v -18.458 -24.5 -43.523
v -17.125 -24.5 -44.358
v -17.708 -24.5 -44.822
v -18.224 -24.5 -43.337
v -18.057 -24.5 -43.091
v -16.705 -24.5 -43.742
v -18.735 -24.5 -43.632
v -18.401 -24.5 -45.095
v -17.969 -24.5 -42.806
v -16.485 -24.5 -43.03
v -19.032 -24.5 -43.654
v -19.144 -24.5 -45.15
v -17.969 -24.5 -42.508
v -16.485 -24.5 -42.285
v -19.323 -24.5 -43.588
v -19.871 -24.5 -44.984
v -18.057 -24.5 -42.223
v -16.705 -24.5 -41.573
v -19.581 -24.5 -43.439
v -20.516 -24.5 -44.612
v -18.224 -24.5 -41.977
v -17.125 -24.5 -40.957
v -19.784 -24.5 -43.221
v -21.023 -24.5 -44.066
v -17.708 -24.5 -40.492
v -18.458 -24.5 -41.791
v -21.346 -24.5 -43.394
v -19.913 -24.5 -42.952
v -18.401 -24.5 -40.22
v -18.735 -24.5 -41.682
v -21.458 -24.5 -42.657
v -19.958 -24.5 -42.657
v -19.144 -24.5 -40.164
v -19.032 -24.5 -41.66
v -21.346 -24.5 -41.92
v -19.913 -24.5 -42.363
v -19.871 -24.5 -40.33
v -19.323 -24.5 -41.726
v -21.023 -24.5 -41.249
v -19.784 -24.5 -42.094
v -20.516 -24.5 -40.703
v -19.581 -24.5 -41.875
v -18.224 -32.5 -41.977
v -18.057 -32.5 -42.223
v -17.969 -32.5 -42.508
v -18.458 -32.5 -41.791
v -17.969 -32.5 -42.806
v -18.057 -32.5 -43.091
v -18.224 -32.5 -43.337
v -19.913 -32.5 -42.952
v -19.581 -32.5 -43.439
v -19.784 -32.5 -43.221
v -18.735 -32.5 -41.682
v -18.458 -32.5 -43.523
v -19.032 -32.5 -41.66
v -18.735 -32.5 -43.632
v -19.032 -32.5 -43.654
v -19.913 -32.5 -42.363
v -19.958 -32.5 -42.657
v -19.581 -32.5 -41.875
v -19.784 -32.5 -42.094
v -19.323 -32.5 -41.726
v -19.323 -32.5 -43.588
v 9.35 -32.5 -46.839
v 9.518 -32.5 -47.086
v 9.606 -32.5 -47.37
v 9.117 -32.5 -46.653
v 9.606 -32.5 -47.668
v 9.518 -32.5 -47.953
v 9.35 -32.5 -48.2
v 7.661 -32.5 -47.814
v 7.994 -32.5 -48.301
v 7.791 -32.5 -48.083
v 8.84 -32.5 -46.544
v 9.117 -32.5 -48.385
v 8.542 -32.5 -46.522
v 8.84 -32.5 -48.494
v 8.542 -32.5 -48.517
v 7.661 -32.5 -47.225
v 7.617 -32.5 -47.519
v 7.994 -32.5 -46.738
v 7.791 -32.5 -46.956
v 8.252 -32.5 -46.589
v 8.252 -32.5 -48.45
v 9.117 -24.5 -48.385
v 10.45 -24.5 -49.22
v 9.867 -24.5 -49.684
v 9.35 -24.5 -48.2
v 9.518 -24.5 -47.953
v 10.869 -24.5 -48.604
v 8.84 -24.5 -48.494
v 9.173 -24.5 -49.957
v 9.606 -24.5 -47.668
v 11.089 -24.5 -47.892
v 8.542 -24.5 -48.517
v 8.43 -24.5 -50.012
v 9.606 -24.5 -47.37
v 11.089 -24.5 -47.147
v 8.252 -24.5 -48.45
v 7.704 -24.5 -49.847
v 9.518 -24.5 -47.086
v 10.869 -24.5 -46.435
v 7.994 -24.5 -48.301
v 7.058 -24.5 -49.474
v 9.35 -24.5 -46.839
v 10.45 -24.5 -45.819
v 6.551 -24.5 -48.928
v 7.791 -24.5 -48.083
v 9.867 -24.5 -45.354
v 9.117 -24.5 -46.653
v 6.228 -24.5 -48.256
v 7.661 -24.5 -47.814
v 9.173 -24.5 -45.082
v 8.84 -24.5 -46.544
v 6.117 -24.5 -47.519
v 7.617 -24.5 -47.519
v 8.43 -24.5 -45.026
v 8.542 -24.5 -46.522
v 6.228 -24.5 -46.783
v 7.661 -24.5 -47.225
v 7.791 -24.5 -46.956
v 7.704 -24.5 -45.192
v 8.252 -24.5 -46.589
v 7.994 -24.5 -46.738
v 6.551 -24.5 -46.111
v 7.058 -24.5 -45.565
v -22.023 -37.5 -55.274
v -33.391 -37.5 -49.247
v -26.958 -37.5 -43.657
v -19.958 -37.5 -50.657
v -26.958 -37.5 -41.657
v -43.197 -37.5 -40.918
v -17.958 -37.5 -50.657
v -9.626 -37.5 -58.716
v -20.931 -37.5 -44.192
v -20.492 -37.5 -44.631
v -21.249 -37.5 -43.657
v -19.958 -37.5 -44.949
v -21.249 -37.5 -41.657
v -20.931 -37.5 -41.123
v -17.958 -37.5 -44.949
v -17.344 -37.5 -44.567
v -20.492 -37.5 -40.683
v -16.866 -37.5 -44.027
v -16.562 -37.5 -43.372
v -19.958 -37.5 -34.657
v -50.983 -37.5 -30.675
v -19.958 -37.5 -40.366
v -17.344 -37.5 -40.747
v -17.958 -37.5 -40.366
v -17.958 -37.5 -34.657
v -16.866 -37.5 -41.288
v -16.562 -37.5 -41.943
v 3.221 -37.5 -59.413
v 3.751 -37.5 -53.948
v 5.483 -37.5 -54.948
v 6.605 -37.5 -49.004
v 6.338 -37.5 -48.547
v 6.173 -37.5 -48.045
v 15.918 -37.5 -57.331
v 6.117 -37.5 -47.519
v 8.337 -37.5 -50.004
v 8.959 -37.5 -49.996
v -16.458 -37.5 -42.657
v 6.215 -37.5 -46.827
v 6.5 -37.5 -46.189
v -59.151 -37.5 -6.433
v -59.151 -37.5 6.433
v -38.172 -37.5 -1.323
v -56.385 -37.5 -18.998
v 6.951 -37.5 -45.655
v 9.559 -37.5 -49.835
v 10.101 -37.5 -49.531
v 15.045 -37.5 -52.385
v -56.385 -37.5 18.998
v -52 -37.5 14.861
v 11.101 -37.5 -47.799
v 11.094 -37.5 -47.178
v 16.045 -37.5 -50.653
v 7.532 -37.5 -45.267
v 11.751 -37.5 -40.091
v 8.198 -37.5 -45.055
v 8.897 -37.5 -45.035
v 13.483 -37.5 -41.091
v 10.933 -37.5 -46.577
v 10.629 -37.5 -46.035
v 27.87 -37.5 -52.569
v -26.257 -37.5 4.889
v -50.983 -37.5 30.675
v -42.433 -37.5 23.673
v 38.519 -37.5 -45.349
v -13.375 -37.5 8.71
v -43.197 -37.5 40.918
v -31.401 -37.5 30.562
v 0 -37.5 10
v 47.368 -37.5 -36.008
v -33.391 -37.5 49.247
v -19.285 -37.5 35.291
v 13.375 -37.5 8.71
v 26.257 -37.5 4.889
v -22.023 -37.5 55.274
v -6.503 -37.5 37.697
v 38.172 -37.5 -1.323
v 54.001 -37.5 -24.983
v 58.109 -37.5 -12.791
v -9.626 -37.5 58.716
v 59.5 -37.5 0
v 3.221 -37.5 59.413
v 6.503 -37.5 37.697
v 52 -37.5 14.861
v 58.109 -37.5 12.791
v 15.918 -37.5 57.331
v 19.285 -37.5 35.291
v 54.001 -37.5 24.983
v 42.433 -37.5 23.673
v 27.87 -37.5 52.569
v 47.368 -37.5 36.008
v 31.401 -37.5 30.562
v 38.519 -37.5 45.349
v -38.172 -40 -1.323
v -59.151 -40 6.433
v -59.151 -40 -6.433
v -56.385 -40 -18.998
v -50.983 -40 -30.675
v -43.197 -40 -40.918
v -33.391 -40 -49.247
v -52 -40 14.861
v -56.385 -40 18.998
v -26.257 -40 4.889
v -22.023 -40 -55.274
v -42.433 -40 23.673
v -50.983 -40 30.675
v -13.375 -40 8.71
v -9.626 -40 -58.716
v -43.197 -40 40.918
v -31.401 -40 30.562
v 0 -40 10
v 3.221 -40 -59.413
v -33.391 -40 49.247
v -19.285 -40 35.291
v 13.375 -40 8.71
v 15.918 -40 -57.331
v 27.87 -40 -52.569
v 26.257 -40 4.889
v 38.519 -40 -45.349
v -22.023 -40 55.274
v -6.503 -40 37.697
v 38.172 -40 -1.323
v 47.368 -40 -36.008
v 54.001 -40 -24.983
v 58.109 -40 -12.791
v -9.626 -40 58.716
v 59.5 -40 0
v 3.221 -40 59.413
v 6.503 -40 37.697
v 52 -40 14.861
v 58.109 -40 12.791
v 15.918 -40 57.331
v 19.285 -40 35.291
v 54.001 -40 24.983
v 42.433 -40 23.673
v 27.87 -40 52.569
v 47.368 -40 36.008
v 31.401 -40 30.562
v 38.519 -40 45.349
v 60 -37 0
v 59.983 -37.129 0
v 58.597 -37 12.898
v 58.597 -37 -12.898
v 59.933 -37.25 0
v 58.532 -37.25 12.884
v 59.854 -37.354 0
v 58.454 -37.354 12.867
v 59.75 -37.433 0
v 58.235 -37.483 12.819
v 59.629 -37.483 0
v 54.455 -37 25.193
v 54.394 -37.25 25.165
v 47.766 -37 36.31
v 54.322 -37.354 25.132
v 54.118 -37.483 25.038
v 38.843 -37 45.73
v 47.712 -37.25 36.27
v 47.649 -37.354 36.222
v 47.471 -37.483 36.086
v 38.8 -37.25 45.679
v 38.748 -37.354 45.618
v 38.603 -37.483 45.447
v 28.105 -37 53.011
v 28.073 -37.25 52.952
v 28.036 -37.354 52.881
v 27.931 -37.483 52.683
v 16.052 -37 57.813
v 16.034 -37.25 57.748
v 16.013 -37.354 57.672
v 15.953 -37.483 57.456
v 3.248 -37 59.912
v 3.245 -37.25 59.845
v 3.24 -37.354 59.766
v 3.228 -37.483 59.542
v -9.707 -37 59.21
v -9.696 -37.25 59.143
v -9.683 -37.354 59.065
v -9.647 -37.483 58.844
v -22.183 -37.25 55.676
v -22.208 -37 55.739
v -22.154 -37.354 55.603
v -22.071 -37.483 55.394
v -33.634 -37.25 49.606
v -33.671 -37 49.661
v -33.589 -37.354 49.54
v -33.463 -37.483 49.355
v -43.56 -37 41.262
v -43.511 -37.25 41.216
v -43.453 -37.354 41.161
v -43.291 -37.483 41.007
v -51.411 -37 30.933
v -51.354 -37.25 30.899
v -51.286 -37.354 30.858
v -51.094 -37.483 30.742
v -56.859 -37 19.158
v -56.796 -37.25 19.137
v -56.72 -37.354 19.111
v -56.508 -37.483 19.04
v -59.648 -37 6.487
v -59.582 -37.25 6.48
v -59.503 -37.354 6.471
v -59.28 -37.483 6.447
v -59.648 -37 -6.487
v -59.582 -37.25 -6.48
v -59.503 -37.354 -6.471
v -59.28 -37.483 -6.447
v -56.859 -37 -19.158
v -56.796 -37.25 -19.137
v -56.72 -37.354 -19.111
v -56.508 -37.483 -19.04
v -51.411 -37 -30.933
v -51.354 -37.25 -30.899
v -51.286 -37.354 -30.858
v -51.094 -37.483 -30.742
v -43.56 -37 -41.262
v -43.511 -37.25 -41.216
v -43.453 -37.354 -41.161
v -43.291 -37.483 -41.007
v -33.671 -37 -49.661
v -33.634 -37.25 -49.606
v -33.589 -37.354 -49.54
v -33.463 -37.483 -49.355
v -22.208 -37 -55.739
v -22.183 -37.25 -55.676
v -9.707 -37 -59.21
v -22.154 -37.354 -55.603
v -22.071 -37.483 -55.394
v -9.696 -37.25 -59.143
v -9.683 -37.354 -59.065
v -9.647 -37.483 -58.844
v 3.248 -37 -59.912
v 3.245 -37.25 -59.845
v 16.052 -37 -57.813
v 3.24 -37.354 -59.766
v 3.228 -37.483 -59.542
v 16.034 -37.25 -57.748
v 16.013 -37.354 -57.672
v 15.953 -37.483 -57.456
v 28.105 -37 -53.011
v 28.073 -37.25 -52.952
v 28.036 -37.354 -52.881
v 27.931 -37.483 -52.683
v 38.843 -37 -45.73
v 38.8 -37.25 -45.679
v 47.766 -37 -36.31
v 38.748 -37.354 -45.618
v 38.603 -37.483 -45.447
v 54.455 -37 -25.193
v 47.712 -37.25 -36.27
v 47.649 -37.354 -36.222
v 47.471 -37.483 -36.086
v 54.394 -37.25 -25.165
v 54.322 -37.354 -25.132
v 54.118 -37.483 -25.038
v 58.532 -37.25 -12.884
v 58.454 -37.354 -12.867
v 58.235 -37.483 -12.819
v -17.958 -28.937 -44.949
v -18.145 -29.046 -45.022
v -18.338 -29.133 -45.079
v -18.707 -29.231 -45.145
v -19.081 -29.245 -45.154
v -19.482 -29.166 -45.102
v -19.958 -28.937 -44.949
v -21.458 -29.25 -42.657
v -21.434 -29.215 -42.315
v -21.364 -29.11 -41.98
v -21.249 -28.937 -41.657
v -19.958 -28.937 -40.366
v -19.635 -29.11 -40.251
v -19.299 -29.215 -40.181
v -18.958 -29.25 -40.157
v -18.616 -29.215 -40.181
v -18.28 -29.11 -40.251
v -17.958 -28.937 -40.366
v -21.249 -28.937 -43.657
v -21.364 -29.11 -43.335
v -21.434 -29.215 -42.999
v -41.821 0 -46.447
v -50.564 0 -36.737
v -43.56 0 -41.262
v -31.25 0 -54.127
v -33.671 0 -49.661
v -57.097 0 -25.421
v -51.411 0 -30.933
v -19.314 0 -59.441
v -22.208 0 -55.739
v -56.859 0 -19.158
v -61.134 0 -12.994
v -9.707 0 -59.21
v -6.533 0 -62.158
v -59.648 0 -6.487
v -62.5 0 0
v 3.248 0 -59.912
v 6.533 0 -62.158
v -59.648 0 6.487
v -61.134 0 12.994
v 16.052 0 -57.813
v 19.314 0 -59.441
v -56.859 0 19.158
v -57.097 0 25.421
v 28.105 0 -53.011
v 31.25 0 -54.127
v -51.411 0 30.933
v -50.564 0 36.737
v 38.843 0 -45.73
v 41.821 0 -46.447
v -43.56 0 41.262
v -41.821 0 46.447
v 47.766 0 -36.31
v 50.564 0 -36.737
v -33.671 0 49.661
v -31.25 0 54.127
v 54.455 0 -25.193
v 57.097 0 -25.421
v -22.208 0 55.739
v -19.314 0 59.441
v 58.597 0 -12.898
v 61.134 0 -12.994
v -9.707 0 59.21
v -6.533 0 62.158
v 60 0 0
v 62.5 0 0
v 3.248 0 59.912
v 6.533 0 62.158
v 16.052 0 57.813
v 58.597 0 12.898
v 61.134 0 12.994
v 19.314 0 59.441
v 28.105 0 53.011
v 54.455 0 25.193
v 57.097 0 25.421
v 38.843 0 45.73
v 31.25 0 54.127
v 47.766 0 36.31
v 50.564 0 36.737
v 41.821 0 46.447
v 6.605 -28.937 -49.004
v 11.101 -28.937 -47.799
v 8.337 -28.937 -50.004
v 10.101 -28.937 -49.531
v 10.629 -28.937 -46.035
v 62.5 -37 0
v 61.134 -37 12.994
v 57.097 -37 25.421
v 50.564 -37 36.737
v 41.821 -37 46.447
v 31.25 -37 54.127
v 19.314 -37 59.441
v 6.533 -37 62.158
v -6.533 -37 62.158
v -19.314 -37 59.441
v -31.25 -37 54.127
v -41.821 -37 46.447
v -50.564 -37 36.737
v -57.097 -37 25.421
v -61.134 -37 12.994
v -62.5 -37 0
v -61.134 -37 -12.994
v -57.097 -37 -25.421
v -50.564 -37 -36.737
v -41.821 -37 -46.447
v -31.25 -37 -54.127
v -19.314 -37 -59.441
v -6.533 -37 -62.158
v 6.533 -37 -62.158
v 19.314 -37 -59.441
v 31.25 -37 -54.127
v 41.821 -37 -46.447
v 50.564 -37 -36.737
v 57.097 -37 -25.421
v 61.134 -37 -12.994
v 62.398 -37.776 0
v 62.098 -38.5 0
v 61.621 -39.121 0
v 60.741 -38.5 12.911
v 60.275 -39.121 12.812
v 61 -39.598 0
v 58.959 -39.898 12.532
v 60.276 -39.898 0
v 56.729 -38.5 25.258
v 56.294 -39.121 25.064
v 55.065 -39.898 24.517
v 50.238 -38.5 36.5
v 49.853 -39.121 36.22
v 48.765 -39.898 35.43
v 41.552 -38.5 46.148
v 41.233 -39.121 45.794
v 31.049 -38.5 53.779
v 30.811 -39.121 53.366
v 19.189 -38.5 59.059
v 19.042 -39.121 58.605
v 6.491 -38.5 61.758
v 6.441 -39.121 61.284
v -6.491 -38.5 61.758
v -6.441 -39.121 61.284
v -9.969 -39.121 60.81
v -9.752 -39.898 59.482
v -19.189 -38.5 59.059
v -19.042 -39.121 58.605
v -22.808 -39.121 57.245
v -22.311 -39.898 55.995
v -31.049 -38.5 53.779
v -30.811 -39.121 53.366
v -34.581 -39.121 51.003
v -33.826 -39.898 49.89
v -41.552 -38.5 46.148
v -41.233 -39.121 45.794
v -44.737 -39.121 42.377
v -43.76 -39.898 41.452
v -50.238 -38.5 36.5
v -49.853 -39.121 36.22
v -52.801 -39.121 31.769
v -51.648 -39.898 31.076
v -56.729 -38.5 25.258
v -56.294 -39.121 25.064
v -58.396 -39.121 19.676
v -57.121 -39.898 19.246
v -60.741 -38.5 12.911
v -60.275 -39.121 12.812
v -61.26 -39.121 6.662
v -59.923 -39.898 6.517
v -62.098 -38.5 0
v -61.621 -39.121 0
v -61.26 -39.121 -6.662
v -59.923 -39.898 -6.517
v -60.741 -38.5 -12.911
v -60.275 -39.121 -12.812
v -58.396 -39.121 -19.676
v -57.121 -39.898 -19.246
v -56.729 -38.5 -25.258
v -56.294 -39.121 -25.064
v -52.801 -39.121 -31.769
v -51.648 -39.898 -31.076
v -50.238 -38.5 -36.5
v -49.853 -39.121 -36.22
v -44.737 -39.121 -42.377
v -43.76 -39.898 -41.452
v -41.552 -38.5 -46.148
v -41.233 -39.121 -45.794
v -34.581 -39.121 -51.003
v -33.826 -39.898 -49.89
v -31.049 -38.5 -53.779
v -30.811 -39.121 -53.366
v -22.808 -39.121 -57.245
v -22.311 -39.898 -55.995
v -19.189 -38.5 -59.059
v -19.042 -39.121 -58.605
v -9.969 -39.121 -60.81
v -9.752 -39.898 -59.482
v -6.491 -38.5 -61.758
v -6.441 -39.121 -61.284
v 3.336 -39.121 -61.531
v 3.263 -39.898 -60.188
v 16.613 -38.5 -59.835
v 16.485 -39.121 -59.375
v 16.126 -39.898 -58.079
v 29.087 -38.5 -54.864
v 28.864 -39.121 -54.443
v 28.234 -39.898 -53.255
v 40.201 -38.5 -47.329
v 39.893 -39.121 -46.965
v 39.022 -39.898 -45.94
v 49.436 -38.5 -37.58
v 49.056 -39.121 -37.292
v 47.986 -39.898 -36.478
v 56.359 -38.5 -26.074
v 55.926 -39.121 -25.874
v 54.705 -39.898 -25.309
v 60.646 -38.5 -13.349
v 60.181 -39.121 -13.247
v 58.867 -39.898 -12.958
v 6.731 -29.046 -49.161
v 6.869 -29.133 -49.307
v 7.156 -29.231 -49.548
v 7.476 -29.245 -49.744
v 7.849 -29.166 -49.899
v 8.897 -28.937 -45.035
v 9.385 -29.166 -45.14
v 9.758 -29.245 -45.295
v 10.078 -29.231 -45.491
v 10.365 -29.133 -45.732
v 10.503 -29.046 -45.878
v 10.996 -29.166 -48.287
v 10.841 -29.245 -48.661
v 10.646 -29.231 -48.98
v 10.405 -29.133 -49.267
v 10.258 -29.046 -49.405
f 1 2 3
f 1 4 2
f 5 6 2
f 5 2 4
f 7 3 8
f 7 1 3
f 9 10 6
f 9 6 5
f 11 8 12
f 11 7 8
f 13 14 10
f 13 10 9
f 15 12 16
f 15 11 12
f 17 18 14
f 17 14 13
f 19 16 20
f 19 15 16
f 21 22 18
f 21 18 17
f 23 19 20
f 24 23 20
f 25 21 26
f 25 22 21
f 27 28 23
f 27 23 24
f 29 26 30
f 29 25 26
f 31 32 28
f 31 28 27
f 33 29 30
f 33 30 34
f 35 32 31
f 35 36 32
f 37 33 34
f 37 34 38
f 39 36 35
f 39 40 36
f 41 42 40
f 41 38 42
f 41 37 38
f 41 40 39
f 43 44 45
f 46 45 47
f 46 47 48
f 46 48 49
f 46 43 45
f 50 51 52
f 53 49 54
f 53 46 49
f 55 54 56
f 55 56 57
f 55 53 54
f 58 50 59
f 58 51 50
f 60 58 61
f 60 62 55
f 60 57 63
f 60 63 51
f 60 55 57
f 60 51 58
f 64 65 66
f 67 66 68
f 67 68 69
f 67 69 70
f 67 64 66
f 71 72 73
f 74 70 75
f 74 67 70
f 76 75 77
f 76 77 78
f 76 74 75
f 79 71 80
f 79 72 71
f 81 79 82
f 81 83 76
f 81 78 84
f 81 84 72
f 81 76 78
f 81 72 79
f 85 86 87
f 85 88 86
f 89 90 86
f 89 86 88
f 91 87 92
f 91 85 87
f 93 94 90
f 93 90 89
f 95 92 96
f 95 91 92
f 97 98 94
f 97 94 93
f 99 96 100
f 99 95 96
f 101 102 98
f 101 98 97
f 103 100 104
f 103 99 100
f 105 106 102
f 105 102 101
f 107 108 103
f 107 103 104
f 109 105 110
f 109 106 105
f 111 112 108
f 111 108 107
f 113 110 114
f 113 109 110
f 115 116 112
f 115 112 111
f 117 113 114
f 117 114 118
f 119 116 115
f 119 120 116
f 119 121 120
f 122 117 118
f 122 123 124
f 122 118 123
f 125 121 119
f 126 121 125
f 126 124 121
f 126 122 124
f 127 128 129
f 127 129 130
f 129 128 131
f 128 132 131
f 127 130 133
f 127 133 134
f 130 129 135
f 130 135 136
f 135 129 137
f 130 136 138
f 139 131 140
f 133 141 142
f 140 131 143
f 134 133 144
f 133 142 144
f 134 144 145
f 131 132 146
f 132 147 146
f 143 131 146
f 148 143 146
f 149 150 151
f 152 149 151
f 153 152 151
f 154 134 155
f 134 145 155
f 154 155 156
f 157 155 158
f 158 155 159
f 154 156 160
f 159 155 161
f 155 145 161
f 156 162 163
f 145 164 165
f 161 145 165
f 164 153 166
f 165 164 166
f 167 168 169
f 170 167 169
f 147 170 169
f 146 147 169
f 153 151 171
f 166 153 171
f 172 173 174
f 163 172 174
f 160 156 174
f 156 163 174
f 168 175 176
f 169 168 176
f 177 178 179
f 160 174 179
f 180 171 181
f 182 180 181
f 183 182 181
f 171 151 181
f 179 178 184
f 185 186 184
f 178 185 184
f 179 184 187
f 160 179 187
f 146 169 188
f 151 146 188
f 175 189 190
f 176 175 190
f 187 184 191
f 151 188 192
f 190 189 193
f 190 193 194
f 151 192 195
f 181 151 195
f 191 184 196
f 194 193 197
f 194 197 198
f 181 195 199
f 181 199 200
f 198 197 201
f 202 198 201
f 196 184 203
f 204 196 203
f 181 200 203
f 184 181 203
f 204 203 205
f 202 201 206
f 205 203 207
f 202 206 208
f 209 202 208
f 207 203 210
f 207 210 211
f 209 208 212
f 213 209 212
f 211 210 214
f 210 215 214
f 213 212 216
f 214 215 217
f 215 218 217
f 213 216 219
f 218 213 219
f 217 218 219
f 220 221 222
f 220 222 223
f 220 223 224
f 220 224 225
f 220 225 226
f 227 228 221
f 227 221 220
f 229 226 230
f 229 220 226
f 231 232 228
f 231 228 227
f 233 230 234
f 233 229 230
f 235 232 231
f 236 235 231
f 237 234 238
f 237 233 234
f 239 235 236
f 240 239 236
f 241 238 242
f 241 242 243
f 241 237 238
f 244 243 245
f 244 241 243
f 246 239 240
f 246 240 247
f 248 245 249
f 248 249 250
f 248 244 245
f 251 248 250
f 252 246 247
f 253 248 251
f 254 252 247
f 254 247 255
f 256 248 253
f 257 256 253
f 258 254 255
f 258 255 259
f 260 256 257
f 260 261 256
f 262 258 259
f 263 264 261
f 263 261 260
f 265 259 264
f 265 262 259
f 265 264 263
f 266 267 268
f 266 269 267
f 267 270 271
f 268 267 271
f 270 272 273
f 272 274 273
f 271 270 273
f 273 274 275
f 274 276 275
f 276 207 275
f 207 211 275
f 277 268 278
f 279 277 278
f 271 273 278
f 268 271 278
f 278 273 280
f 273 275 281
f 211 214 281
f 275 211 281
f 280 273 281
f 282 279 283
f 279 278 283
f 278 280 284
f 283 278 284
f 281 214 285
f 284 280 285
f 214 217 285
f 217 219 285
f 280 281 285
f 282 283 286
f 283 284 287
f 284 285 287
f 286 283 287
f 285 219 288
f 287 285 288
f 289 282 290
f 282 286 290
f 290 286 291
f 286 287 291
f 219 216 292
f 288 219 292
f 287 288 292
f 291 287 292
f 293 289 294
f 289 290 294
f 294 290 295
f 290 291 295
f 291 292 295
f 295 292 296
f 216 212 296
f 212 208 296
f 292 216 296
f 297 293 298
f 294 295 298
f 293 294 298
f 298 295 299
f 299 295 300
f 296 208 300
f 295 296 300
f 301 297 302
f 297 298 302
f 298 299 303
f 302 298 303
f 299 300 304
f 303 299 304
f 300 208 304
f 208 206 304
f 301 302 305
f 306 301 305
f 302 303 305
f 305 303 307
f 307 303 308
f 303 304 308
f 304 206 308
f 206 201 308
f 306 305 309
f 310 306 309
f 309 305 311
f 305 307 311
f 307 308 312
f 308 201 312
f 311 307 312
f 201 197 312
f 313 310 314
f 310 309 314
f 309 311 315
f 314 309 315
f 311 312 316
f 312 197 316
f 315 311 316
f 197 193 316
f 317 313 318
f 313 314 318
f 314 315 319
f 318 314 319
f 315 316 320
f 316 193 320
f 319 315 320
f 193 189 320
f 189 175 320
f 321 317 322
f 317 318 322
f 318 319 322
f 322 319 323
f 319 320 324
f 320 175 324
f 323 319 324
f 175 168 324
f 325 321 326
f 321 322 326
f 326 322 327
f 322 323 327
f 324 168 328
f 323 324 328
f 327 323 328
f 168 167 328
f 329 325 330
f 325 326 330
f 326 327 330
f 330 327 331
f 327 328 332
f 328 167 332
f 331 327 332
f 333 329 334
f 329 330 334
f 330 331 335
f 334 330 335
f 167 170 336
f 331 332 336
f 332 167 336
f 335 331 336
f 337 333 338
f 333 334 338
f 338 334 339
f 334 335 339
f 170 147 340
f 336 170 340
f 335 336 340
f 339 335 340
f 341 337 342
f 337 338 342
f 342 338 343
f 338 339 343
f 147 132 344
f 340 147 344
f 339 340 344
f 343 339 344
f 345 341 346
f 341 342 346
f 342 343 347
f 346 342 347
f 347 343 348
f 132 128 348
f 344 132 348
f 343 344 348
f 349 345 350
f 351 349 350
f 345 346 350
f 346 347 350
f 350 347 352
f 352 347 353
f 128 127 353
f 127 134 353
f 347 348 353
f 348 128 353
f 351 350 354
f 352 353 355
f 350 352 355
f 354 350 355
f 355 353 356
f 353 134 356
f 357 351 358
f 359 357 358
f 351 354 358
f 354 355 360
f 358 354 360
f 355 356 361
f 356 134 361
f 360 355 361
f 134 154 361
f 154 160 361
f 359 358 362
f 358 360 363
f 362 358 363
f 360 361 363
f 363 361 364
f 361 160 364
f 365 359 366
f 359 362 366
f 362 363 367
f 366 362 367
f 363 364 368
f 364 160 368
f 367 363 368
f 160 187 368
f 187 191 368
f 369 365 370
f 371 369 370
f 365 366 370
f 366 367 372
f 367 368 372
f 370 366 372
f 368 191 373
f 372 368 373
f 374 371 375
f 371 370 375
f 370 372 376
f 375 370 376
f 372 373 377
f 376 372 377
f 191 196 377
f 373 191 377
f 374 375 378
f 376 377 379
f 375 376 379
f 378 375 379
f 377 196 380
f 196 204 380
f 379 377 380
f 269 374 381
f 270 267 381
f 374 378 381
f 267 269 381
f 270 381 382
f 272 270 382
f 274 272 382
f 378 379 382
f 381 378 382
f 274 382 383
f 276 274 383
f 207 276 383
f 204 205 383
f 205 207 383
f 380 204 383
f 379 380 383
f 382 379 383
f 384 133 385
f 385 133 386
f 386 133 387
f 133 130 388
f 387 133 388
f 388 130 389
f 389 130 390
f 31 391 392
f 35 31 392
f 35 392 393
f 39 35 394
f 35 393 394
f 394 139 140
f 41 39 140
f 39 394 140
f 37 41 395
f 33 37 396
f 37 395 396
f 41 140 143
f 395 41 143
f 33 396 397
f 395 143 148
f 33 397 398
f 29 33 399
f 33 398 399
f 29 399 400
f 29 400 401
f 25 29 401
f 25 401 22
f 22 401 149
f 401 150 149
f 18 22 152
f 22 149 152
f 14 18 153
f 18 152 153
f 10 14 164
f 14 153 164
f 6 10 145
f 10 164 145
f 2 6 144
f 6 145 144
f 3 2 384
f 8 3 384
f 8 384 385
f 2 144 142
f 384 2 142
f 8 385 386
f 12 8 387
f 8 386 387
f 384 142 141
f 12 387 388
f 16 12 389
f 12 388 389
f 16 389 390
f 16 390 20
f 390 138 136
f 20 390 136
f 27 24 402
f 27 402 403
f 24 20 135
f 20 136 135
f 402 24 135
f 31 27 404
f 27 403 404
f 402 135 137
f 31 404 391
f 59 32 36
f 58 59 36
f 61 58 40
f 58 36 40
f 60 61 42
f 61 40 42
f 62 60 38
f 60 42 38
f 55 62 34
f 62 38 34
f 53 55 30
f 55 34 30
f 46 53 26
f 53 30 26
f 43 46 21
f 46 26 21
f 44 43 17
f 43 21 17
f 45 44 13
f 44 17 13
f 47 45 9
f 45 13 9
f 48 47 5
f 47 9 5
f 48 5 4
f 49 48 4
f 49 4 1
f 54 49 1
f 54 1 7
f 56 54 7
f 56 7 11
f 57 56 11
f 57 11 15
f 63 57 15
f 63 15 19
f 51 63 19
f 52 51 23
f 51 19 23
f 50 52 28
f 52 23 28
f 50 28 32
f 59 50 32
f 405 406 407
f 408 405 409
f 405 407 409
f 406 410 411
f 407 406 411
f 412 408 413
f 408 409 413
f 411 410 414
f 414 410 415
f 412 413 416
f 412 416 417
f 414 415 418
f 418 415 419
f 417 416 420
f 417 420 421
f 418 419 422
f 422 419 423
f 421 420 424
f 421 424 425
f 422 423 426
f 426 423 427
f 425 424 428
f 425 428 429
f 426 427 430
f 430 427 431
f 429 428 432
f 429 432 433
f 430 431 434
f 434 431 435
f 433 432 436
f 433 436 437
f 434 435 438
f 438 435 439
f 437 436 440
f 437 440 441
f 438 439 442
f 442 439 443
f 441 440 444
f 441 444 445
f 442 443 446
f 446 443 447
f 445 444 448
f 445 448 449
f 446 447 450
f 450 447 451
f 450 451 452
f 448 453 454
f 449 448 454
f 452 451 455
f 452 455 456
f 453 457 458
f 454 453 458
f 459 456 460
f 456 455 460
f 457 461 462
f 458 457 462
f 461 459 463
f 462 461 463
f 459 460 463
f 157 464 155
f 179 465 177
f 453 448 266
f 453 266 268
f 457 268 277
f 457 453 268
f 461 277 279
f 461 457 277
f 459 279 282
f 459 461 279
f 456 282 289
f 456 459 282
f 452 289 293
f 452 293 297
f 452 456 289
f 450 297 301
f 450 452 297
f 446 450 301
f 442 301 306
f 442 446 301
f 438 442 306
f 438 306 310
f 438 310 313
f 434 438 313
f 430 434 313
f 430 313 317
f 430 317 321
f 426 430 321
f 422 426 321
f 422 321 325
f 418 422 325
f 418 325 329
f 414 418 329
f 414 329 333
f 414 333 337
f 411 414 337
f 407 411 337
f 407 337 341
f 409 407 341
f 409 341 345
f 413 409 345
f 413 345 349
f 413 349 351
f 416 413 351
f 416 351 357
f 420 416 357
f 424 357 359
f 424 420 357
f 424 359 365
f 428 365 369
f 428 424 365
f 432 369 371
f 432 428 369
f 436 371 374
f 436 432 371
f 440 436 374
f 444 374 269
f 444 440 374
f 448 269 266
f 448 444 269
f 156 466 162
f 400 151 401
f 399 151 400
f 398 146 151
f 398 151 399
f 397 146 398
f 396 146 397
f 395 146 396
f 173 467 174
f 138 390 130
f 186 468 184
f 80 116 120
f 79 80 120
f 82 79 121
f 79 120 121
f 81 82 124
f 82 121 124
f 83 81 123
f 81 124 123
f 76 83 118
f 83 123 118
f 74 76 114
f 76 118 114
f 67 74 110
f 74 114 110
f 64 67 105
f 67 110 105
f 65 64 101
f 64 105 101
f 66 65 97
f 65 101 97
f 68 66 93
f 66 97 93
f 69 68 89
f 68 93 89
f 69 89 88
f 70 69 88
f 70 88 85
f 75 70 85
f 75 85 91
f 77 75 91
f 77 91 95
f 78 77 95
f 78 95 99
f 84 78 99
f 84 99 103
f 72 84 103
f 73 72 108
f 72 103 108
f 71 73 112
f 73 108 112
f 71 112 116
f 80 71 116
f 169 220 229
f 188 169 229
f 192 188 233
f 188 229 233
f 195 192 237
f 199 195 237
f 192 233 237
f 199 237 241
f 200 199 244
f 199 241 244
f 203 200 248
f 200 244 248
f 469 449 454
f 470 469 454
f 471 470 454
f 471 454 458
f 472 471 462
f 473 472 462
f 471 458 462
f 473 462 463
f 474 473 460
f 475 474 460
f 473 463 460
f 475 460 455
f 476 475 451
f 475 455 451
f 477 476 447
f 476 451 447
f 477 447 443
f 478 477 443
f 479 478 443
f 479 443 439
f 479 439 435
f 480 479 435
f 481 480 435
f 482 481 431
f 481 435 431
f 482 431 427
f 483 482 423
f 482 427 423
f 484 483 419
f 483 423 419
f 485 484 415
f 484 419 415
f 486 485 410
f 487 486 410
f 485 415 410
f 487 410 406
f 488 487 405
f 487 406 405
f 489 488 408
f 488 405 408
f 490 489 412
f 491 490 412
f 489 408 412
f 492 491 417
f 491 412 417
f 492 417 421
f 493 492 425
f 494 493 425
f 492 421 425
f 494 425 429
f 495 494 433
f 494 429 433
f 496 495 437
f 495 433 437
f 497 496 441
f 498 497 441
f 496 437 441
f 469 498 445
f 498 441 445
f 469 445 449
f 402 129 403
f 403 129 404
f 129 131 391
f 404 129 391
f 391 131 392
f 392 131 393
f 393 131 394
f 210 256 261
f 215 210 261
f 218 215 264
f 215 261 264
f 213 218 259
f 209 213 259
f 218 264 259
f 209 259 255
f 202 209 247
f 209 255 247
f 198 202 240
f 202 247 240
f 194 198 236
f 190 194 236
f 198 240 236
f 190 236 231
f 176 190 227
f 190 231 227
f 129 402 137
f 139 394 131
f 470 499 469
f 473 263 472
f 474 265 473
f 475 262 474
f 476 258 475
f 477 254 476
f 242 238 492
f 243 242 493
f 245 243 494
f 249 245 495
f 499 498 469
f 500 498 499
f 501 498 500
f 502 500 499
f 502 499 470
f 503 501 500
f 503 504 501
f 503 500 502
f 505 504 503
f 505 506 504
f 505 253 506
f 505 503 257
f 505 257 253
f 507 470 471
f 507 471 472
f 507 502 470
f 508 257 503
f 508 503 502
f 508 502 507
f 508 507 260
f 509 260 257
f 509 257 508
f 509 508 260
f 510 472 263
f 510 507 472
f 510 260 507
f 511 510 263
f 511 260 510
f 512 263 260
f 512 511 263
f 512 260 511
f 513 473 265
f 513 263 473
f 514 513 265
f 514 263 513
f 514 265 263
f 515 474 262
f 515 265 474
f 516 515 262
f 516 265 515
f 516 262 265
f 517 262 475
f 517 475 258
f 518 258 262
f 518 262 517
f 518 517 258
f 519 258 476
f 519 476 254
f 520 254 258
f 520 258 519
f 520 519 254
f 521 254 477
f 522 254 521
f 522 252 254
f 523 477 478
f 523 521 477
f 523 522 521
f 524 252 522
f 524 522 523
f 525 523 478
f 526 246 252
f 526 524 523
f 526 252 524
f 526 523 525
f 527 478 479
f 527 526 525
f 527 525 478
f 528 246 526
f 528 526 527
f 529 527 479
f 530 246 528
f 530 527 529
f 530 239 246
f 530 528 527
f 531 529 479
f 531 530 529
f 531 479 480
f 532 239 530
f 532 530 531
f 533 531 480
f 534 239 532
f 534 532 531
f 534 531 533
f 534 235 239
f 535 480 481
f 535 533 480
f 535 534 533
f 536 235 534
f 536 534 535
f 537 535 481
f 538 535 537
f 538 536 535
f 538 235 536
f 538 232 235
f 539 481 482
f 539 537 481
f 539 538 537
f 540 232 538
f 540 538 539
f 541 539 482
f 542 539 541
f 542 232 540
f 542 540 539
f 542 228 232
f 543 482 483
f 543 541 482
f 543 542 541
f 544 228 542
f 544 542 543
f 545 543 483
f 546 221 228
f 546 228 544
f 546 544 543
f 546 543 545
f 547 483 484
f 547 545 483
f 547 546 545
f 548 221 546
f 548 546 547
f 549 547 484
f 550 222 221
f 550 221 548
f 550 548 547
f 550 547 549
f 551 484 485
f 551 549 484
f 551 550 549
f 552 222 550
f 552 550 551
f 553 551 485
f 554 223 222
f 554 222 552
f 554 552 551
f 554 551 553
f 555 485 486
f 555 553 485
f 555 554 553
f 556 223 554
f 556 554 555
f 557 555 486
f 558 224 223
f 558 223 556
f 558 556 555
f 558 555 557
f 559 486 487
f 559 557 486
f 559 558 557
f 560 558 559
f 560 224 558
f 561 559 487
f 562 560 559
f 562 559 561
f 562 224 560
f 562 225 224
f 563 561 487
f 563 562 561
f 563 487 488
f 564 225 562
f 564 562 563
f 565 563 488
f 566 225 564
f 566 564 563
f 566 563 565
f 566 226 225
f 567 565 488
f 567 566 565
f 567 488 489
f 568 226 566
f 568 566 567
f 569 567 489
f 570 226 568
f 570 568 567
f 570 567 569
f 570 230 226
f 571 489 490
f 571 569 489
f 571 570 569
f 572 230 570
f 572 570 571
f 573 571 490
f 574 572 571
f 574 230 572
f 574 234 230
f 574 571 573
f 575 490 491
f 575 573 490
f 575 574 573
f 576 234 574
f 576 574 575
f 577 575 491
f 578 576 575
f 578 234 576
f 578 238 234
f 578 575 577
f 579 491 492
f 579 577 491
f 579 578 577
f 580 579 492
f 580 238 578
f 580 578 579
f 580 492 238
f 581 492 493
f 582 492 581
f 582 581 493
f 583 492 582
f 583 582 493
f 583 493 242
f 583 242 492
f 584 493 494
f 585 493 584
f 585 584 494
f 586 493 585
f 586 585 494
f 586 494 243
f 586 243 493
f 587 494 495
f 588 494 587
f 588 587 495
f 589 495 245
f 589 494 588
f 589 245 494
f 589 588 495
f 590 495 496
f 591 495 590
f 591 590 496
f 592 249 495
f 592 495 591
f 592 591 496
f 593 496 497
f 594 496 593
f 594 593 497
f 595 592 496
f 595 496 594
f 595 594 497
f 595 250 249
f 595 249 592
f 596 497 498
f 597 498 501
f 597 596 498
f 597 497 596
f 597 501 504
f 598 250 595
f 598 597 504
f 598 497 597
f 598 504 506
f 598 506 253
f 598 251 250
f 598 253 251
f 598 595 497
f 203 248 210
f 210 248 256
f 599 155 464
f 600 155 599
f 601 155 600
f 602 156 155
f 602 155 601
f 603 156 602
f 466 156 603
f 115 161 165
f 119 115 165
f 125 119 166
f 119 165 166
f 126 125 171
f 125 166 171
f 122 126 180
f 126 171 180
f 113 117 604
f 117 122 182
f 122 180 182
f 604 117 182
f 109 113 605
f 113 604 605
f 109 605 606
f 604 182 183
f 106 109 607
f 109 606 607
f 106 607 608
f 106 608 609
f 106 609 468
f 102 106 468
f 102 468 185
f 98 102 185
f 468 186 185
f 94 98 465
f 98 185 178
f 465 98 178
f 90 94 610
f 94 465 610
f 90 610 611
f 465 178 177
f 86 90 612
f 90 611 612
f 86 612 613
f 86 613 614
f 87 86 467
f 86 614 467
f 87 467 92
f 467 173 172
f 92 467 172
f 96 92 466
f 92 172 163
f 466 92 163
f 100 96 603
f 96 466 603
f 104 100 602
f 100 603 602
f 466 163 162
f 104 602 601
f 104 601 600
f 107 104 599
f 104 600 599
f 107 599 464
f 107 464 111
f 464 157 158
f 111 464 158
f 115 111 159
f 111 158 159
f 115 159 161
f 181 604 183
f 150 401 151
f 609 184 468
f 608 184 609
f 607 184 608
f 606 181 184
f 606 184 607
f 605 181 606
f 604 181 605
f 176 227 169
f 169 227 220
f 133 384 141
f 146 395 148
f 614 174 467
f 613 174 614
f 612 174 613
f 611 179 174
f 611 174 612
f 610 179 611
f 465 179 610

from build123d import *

# Parameters (mm, degrees)
F0_R             = 62.5
F1_DEPTH         = 40
F2_R             = 3
F3_T             = -2.5
F5_DEPTH         = 2.5
F6_R             = 2.5
F7_DEPTH         = 13
F8_R             = 1
F9_DEPTH         = 8
F12_DEPTH        = 1
F12_COPIES_COUNT = 3
F12_COPIES_ANGLE = 180
F15_DEPTH        = 1
F15_DEPTH_BACK   = 1
F15_COPIES_COUNT = 3
F15_COPIES_ANGLE = 180


# Not quite as in the source:
# - a pattern or mirror of a feature is missing from the dataset's text; its kind, count and spacing are read off the source's solid


with BuildPart() as f1:
    # F0 (on Front) → F1 (new body)
    with BuildSketch(Plane.XZ):
        Circle(F0_R)
    extrude(amount=F1_DEPTH)

    # F2
    f2_edges = [f1.edges().sort_by_distance(p)[0] for p in [
        (-62.5, -40, 0),
    ]]
    fillet(f2_edges, radius=F2_R)

    # F3
    f3_openings = [f1.faces().sort_by_distance(p)[0] for p in [
        (0, 0, 0),
    ]]
    offset(amount=F3_T, openings=f3_openings)

    # F4 (on face) → F5 (cut, through all)
    with BuildSketch(Plane.XZ.offset(40)):
        with BuildLine():
            ThreePointArc((52, 14.8614980554), (0, 38), (-52, 14.8614980554))
            Line((-52, 14.8614980554), (-38.1715582316, -1.3234958252))
            ThreePointArc((-38.1715582316, -1.3234958252), (0, 10), (38.1715582316, -1.3234958252))
            Line((38.1715582316, -1.3234958252), (52, 14.8614980554))
        make_face()
    extrude(amount=-F5_DEPTH, mode=Mode.SUBTRACT)

    # F6 (on face) → F7 (join)
    with BuildSketch(Plane(origin=(0, -37.5, 0), x_dir=(-1, 0, 0), z_dir=(0, 1, 0))):
        with Locations((-8.6170678389, -47.5194215546)):
            Circle(F6_R)
        with Locations((18.9575492455, -42.6572725799)):
            Circle(F6_R)
    extrude(amount=F7_DEPTH)

    # F8 (on face) → F9 (cut)
    with BuildSketch(Plane(origin=(0, -24.5, 0), x_dir=(-1, 0, 0), z_dir=(0, 1, 0))):
        with Locations((-8.6170678389, -47.5194215546)):
            Circle(F8_R)
        with Locations((18.9575492455, -42.6572725799)):
            Circle(F8_R)
    extrude(amount=-F9_DEPTH, mode=Mode.SUBTRACT)

    # F11 (on face) → F12 (join, symmetric)
    with BuildSketch(Plane(origin=(27.0393139988, 0, -15.6111552159), x_dir=(0, -1, 0), z_dir=(-0.8660254038, 0, 0.5))):
        Polygon((28.5, -34.84449232), (37.5, -34.84449232), (37.5, -28.84449232), align=None)
    f12 = extrude(amount=F12_DEPTH, both=True)

    # F12_copies: F12 ×3 about axis
    f12_copies_axis = Axis((8.617068, 0, -47.519422), (0, 1, 0))
    for i in range(1, F12_COPIES_COUNT):
        add(f12.rotate(f12_copies_axis, i * F12_COPIES_ANGLE / (F12_COPIES_COUNT - 1)))

    # F14 (on face) → F15 (join, two sides)
    with BuildSketch(Plane(origin=(-18.9575492455, 0, 0), x_dir=(0, -1, 0), z_dir=(-1, 0, 0))) as f15_sk:
        Polygon((28.5, -40.6572725799), (37.5, -40.6572725799), (37.5, -40.1572725799), (37.5, -34.6572725799), align=None)
    f15 = extrude(amount=F15_DEPTH) + extrude(f15_sk.sketch, amount=-F15_DEPTH_BACK)

    # F15_copies: F15 ×3 about axis
    f15_copies_axis = Axis((-18.957549, 0, -42.657273), (0, -1, 0))
    for i in range(1, F15_COPIES_COUNT):
        add(f15.rotate(f15_copies_axis, i * F15_COPIES_ANGLE / (F15_COPIES_COUNT - 1)))


solid = f1.part
